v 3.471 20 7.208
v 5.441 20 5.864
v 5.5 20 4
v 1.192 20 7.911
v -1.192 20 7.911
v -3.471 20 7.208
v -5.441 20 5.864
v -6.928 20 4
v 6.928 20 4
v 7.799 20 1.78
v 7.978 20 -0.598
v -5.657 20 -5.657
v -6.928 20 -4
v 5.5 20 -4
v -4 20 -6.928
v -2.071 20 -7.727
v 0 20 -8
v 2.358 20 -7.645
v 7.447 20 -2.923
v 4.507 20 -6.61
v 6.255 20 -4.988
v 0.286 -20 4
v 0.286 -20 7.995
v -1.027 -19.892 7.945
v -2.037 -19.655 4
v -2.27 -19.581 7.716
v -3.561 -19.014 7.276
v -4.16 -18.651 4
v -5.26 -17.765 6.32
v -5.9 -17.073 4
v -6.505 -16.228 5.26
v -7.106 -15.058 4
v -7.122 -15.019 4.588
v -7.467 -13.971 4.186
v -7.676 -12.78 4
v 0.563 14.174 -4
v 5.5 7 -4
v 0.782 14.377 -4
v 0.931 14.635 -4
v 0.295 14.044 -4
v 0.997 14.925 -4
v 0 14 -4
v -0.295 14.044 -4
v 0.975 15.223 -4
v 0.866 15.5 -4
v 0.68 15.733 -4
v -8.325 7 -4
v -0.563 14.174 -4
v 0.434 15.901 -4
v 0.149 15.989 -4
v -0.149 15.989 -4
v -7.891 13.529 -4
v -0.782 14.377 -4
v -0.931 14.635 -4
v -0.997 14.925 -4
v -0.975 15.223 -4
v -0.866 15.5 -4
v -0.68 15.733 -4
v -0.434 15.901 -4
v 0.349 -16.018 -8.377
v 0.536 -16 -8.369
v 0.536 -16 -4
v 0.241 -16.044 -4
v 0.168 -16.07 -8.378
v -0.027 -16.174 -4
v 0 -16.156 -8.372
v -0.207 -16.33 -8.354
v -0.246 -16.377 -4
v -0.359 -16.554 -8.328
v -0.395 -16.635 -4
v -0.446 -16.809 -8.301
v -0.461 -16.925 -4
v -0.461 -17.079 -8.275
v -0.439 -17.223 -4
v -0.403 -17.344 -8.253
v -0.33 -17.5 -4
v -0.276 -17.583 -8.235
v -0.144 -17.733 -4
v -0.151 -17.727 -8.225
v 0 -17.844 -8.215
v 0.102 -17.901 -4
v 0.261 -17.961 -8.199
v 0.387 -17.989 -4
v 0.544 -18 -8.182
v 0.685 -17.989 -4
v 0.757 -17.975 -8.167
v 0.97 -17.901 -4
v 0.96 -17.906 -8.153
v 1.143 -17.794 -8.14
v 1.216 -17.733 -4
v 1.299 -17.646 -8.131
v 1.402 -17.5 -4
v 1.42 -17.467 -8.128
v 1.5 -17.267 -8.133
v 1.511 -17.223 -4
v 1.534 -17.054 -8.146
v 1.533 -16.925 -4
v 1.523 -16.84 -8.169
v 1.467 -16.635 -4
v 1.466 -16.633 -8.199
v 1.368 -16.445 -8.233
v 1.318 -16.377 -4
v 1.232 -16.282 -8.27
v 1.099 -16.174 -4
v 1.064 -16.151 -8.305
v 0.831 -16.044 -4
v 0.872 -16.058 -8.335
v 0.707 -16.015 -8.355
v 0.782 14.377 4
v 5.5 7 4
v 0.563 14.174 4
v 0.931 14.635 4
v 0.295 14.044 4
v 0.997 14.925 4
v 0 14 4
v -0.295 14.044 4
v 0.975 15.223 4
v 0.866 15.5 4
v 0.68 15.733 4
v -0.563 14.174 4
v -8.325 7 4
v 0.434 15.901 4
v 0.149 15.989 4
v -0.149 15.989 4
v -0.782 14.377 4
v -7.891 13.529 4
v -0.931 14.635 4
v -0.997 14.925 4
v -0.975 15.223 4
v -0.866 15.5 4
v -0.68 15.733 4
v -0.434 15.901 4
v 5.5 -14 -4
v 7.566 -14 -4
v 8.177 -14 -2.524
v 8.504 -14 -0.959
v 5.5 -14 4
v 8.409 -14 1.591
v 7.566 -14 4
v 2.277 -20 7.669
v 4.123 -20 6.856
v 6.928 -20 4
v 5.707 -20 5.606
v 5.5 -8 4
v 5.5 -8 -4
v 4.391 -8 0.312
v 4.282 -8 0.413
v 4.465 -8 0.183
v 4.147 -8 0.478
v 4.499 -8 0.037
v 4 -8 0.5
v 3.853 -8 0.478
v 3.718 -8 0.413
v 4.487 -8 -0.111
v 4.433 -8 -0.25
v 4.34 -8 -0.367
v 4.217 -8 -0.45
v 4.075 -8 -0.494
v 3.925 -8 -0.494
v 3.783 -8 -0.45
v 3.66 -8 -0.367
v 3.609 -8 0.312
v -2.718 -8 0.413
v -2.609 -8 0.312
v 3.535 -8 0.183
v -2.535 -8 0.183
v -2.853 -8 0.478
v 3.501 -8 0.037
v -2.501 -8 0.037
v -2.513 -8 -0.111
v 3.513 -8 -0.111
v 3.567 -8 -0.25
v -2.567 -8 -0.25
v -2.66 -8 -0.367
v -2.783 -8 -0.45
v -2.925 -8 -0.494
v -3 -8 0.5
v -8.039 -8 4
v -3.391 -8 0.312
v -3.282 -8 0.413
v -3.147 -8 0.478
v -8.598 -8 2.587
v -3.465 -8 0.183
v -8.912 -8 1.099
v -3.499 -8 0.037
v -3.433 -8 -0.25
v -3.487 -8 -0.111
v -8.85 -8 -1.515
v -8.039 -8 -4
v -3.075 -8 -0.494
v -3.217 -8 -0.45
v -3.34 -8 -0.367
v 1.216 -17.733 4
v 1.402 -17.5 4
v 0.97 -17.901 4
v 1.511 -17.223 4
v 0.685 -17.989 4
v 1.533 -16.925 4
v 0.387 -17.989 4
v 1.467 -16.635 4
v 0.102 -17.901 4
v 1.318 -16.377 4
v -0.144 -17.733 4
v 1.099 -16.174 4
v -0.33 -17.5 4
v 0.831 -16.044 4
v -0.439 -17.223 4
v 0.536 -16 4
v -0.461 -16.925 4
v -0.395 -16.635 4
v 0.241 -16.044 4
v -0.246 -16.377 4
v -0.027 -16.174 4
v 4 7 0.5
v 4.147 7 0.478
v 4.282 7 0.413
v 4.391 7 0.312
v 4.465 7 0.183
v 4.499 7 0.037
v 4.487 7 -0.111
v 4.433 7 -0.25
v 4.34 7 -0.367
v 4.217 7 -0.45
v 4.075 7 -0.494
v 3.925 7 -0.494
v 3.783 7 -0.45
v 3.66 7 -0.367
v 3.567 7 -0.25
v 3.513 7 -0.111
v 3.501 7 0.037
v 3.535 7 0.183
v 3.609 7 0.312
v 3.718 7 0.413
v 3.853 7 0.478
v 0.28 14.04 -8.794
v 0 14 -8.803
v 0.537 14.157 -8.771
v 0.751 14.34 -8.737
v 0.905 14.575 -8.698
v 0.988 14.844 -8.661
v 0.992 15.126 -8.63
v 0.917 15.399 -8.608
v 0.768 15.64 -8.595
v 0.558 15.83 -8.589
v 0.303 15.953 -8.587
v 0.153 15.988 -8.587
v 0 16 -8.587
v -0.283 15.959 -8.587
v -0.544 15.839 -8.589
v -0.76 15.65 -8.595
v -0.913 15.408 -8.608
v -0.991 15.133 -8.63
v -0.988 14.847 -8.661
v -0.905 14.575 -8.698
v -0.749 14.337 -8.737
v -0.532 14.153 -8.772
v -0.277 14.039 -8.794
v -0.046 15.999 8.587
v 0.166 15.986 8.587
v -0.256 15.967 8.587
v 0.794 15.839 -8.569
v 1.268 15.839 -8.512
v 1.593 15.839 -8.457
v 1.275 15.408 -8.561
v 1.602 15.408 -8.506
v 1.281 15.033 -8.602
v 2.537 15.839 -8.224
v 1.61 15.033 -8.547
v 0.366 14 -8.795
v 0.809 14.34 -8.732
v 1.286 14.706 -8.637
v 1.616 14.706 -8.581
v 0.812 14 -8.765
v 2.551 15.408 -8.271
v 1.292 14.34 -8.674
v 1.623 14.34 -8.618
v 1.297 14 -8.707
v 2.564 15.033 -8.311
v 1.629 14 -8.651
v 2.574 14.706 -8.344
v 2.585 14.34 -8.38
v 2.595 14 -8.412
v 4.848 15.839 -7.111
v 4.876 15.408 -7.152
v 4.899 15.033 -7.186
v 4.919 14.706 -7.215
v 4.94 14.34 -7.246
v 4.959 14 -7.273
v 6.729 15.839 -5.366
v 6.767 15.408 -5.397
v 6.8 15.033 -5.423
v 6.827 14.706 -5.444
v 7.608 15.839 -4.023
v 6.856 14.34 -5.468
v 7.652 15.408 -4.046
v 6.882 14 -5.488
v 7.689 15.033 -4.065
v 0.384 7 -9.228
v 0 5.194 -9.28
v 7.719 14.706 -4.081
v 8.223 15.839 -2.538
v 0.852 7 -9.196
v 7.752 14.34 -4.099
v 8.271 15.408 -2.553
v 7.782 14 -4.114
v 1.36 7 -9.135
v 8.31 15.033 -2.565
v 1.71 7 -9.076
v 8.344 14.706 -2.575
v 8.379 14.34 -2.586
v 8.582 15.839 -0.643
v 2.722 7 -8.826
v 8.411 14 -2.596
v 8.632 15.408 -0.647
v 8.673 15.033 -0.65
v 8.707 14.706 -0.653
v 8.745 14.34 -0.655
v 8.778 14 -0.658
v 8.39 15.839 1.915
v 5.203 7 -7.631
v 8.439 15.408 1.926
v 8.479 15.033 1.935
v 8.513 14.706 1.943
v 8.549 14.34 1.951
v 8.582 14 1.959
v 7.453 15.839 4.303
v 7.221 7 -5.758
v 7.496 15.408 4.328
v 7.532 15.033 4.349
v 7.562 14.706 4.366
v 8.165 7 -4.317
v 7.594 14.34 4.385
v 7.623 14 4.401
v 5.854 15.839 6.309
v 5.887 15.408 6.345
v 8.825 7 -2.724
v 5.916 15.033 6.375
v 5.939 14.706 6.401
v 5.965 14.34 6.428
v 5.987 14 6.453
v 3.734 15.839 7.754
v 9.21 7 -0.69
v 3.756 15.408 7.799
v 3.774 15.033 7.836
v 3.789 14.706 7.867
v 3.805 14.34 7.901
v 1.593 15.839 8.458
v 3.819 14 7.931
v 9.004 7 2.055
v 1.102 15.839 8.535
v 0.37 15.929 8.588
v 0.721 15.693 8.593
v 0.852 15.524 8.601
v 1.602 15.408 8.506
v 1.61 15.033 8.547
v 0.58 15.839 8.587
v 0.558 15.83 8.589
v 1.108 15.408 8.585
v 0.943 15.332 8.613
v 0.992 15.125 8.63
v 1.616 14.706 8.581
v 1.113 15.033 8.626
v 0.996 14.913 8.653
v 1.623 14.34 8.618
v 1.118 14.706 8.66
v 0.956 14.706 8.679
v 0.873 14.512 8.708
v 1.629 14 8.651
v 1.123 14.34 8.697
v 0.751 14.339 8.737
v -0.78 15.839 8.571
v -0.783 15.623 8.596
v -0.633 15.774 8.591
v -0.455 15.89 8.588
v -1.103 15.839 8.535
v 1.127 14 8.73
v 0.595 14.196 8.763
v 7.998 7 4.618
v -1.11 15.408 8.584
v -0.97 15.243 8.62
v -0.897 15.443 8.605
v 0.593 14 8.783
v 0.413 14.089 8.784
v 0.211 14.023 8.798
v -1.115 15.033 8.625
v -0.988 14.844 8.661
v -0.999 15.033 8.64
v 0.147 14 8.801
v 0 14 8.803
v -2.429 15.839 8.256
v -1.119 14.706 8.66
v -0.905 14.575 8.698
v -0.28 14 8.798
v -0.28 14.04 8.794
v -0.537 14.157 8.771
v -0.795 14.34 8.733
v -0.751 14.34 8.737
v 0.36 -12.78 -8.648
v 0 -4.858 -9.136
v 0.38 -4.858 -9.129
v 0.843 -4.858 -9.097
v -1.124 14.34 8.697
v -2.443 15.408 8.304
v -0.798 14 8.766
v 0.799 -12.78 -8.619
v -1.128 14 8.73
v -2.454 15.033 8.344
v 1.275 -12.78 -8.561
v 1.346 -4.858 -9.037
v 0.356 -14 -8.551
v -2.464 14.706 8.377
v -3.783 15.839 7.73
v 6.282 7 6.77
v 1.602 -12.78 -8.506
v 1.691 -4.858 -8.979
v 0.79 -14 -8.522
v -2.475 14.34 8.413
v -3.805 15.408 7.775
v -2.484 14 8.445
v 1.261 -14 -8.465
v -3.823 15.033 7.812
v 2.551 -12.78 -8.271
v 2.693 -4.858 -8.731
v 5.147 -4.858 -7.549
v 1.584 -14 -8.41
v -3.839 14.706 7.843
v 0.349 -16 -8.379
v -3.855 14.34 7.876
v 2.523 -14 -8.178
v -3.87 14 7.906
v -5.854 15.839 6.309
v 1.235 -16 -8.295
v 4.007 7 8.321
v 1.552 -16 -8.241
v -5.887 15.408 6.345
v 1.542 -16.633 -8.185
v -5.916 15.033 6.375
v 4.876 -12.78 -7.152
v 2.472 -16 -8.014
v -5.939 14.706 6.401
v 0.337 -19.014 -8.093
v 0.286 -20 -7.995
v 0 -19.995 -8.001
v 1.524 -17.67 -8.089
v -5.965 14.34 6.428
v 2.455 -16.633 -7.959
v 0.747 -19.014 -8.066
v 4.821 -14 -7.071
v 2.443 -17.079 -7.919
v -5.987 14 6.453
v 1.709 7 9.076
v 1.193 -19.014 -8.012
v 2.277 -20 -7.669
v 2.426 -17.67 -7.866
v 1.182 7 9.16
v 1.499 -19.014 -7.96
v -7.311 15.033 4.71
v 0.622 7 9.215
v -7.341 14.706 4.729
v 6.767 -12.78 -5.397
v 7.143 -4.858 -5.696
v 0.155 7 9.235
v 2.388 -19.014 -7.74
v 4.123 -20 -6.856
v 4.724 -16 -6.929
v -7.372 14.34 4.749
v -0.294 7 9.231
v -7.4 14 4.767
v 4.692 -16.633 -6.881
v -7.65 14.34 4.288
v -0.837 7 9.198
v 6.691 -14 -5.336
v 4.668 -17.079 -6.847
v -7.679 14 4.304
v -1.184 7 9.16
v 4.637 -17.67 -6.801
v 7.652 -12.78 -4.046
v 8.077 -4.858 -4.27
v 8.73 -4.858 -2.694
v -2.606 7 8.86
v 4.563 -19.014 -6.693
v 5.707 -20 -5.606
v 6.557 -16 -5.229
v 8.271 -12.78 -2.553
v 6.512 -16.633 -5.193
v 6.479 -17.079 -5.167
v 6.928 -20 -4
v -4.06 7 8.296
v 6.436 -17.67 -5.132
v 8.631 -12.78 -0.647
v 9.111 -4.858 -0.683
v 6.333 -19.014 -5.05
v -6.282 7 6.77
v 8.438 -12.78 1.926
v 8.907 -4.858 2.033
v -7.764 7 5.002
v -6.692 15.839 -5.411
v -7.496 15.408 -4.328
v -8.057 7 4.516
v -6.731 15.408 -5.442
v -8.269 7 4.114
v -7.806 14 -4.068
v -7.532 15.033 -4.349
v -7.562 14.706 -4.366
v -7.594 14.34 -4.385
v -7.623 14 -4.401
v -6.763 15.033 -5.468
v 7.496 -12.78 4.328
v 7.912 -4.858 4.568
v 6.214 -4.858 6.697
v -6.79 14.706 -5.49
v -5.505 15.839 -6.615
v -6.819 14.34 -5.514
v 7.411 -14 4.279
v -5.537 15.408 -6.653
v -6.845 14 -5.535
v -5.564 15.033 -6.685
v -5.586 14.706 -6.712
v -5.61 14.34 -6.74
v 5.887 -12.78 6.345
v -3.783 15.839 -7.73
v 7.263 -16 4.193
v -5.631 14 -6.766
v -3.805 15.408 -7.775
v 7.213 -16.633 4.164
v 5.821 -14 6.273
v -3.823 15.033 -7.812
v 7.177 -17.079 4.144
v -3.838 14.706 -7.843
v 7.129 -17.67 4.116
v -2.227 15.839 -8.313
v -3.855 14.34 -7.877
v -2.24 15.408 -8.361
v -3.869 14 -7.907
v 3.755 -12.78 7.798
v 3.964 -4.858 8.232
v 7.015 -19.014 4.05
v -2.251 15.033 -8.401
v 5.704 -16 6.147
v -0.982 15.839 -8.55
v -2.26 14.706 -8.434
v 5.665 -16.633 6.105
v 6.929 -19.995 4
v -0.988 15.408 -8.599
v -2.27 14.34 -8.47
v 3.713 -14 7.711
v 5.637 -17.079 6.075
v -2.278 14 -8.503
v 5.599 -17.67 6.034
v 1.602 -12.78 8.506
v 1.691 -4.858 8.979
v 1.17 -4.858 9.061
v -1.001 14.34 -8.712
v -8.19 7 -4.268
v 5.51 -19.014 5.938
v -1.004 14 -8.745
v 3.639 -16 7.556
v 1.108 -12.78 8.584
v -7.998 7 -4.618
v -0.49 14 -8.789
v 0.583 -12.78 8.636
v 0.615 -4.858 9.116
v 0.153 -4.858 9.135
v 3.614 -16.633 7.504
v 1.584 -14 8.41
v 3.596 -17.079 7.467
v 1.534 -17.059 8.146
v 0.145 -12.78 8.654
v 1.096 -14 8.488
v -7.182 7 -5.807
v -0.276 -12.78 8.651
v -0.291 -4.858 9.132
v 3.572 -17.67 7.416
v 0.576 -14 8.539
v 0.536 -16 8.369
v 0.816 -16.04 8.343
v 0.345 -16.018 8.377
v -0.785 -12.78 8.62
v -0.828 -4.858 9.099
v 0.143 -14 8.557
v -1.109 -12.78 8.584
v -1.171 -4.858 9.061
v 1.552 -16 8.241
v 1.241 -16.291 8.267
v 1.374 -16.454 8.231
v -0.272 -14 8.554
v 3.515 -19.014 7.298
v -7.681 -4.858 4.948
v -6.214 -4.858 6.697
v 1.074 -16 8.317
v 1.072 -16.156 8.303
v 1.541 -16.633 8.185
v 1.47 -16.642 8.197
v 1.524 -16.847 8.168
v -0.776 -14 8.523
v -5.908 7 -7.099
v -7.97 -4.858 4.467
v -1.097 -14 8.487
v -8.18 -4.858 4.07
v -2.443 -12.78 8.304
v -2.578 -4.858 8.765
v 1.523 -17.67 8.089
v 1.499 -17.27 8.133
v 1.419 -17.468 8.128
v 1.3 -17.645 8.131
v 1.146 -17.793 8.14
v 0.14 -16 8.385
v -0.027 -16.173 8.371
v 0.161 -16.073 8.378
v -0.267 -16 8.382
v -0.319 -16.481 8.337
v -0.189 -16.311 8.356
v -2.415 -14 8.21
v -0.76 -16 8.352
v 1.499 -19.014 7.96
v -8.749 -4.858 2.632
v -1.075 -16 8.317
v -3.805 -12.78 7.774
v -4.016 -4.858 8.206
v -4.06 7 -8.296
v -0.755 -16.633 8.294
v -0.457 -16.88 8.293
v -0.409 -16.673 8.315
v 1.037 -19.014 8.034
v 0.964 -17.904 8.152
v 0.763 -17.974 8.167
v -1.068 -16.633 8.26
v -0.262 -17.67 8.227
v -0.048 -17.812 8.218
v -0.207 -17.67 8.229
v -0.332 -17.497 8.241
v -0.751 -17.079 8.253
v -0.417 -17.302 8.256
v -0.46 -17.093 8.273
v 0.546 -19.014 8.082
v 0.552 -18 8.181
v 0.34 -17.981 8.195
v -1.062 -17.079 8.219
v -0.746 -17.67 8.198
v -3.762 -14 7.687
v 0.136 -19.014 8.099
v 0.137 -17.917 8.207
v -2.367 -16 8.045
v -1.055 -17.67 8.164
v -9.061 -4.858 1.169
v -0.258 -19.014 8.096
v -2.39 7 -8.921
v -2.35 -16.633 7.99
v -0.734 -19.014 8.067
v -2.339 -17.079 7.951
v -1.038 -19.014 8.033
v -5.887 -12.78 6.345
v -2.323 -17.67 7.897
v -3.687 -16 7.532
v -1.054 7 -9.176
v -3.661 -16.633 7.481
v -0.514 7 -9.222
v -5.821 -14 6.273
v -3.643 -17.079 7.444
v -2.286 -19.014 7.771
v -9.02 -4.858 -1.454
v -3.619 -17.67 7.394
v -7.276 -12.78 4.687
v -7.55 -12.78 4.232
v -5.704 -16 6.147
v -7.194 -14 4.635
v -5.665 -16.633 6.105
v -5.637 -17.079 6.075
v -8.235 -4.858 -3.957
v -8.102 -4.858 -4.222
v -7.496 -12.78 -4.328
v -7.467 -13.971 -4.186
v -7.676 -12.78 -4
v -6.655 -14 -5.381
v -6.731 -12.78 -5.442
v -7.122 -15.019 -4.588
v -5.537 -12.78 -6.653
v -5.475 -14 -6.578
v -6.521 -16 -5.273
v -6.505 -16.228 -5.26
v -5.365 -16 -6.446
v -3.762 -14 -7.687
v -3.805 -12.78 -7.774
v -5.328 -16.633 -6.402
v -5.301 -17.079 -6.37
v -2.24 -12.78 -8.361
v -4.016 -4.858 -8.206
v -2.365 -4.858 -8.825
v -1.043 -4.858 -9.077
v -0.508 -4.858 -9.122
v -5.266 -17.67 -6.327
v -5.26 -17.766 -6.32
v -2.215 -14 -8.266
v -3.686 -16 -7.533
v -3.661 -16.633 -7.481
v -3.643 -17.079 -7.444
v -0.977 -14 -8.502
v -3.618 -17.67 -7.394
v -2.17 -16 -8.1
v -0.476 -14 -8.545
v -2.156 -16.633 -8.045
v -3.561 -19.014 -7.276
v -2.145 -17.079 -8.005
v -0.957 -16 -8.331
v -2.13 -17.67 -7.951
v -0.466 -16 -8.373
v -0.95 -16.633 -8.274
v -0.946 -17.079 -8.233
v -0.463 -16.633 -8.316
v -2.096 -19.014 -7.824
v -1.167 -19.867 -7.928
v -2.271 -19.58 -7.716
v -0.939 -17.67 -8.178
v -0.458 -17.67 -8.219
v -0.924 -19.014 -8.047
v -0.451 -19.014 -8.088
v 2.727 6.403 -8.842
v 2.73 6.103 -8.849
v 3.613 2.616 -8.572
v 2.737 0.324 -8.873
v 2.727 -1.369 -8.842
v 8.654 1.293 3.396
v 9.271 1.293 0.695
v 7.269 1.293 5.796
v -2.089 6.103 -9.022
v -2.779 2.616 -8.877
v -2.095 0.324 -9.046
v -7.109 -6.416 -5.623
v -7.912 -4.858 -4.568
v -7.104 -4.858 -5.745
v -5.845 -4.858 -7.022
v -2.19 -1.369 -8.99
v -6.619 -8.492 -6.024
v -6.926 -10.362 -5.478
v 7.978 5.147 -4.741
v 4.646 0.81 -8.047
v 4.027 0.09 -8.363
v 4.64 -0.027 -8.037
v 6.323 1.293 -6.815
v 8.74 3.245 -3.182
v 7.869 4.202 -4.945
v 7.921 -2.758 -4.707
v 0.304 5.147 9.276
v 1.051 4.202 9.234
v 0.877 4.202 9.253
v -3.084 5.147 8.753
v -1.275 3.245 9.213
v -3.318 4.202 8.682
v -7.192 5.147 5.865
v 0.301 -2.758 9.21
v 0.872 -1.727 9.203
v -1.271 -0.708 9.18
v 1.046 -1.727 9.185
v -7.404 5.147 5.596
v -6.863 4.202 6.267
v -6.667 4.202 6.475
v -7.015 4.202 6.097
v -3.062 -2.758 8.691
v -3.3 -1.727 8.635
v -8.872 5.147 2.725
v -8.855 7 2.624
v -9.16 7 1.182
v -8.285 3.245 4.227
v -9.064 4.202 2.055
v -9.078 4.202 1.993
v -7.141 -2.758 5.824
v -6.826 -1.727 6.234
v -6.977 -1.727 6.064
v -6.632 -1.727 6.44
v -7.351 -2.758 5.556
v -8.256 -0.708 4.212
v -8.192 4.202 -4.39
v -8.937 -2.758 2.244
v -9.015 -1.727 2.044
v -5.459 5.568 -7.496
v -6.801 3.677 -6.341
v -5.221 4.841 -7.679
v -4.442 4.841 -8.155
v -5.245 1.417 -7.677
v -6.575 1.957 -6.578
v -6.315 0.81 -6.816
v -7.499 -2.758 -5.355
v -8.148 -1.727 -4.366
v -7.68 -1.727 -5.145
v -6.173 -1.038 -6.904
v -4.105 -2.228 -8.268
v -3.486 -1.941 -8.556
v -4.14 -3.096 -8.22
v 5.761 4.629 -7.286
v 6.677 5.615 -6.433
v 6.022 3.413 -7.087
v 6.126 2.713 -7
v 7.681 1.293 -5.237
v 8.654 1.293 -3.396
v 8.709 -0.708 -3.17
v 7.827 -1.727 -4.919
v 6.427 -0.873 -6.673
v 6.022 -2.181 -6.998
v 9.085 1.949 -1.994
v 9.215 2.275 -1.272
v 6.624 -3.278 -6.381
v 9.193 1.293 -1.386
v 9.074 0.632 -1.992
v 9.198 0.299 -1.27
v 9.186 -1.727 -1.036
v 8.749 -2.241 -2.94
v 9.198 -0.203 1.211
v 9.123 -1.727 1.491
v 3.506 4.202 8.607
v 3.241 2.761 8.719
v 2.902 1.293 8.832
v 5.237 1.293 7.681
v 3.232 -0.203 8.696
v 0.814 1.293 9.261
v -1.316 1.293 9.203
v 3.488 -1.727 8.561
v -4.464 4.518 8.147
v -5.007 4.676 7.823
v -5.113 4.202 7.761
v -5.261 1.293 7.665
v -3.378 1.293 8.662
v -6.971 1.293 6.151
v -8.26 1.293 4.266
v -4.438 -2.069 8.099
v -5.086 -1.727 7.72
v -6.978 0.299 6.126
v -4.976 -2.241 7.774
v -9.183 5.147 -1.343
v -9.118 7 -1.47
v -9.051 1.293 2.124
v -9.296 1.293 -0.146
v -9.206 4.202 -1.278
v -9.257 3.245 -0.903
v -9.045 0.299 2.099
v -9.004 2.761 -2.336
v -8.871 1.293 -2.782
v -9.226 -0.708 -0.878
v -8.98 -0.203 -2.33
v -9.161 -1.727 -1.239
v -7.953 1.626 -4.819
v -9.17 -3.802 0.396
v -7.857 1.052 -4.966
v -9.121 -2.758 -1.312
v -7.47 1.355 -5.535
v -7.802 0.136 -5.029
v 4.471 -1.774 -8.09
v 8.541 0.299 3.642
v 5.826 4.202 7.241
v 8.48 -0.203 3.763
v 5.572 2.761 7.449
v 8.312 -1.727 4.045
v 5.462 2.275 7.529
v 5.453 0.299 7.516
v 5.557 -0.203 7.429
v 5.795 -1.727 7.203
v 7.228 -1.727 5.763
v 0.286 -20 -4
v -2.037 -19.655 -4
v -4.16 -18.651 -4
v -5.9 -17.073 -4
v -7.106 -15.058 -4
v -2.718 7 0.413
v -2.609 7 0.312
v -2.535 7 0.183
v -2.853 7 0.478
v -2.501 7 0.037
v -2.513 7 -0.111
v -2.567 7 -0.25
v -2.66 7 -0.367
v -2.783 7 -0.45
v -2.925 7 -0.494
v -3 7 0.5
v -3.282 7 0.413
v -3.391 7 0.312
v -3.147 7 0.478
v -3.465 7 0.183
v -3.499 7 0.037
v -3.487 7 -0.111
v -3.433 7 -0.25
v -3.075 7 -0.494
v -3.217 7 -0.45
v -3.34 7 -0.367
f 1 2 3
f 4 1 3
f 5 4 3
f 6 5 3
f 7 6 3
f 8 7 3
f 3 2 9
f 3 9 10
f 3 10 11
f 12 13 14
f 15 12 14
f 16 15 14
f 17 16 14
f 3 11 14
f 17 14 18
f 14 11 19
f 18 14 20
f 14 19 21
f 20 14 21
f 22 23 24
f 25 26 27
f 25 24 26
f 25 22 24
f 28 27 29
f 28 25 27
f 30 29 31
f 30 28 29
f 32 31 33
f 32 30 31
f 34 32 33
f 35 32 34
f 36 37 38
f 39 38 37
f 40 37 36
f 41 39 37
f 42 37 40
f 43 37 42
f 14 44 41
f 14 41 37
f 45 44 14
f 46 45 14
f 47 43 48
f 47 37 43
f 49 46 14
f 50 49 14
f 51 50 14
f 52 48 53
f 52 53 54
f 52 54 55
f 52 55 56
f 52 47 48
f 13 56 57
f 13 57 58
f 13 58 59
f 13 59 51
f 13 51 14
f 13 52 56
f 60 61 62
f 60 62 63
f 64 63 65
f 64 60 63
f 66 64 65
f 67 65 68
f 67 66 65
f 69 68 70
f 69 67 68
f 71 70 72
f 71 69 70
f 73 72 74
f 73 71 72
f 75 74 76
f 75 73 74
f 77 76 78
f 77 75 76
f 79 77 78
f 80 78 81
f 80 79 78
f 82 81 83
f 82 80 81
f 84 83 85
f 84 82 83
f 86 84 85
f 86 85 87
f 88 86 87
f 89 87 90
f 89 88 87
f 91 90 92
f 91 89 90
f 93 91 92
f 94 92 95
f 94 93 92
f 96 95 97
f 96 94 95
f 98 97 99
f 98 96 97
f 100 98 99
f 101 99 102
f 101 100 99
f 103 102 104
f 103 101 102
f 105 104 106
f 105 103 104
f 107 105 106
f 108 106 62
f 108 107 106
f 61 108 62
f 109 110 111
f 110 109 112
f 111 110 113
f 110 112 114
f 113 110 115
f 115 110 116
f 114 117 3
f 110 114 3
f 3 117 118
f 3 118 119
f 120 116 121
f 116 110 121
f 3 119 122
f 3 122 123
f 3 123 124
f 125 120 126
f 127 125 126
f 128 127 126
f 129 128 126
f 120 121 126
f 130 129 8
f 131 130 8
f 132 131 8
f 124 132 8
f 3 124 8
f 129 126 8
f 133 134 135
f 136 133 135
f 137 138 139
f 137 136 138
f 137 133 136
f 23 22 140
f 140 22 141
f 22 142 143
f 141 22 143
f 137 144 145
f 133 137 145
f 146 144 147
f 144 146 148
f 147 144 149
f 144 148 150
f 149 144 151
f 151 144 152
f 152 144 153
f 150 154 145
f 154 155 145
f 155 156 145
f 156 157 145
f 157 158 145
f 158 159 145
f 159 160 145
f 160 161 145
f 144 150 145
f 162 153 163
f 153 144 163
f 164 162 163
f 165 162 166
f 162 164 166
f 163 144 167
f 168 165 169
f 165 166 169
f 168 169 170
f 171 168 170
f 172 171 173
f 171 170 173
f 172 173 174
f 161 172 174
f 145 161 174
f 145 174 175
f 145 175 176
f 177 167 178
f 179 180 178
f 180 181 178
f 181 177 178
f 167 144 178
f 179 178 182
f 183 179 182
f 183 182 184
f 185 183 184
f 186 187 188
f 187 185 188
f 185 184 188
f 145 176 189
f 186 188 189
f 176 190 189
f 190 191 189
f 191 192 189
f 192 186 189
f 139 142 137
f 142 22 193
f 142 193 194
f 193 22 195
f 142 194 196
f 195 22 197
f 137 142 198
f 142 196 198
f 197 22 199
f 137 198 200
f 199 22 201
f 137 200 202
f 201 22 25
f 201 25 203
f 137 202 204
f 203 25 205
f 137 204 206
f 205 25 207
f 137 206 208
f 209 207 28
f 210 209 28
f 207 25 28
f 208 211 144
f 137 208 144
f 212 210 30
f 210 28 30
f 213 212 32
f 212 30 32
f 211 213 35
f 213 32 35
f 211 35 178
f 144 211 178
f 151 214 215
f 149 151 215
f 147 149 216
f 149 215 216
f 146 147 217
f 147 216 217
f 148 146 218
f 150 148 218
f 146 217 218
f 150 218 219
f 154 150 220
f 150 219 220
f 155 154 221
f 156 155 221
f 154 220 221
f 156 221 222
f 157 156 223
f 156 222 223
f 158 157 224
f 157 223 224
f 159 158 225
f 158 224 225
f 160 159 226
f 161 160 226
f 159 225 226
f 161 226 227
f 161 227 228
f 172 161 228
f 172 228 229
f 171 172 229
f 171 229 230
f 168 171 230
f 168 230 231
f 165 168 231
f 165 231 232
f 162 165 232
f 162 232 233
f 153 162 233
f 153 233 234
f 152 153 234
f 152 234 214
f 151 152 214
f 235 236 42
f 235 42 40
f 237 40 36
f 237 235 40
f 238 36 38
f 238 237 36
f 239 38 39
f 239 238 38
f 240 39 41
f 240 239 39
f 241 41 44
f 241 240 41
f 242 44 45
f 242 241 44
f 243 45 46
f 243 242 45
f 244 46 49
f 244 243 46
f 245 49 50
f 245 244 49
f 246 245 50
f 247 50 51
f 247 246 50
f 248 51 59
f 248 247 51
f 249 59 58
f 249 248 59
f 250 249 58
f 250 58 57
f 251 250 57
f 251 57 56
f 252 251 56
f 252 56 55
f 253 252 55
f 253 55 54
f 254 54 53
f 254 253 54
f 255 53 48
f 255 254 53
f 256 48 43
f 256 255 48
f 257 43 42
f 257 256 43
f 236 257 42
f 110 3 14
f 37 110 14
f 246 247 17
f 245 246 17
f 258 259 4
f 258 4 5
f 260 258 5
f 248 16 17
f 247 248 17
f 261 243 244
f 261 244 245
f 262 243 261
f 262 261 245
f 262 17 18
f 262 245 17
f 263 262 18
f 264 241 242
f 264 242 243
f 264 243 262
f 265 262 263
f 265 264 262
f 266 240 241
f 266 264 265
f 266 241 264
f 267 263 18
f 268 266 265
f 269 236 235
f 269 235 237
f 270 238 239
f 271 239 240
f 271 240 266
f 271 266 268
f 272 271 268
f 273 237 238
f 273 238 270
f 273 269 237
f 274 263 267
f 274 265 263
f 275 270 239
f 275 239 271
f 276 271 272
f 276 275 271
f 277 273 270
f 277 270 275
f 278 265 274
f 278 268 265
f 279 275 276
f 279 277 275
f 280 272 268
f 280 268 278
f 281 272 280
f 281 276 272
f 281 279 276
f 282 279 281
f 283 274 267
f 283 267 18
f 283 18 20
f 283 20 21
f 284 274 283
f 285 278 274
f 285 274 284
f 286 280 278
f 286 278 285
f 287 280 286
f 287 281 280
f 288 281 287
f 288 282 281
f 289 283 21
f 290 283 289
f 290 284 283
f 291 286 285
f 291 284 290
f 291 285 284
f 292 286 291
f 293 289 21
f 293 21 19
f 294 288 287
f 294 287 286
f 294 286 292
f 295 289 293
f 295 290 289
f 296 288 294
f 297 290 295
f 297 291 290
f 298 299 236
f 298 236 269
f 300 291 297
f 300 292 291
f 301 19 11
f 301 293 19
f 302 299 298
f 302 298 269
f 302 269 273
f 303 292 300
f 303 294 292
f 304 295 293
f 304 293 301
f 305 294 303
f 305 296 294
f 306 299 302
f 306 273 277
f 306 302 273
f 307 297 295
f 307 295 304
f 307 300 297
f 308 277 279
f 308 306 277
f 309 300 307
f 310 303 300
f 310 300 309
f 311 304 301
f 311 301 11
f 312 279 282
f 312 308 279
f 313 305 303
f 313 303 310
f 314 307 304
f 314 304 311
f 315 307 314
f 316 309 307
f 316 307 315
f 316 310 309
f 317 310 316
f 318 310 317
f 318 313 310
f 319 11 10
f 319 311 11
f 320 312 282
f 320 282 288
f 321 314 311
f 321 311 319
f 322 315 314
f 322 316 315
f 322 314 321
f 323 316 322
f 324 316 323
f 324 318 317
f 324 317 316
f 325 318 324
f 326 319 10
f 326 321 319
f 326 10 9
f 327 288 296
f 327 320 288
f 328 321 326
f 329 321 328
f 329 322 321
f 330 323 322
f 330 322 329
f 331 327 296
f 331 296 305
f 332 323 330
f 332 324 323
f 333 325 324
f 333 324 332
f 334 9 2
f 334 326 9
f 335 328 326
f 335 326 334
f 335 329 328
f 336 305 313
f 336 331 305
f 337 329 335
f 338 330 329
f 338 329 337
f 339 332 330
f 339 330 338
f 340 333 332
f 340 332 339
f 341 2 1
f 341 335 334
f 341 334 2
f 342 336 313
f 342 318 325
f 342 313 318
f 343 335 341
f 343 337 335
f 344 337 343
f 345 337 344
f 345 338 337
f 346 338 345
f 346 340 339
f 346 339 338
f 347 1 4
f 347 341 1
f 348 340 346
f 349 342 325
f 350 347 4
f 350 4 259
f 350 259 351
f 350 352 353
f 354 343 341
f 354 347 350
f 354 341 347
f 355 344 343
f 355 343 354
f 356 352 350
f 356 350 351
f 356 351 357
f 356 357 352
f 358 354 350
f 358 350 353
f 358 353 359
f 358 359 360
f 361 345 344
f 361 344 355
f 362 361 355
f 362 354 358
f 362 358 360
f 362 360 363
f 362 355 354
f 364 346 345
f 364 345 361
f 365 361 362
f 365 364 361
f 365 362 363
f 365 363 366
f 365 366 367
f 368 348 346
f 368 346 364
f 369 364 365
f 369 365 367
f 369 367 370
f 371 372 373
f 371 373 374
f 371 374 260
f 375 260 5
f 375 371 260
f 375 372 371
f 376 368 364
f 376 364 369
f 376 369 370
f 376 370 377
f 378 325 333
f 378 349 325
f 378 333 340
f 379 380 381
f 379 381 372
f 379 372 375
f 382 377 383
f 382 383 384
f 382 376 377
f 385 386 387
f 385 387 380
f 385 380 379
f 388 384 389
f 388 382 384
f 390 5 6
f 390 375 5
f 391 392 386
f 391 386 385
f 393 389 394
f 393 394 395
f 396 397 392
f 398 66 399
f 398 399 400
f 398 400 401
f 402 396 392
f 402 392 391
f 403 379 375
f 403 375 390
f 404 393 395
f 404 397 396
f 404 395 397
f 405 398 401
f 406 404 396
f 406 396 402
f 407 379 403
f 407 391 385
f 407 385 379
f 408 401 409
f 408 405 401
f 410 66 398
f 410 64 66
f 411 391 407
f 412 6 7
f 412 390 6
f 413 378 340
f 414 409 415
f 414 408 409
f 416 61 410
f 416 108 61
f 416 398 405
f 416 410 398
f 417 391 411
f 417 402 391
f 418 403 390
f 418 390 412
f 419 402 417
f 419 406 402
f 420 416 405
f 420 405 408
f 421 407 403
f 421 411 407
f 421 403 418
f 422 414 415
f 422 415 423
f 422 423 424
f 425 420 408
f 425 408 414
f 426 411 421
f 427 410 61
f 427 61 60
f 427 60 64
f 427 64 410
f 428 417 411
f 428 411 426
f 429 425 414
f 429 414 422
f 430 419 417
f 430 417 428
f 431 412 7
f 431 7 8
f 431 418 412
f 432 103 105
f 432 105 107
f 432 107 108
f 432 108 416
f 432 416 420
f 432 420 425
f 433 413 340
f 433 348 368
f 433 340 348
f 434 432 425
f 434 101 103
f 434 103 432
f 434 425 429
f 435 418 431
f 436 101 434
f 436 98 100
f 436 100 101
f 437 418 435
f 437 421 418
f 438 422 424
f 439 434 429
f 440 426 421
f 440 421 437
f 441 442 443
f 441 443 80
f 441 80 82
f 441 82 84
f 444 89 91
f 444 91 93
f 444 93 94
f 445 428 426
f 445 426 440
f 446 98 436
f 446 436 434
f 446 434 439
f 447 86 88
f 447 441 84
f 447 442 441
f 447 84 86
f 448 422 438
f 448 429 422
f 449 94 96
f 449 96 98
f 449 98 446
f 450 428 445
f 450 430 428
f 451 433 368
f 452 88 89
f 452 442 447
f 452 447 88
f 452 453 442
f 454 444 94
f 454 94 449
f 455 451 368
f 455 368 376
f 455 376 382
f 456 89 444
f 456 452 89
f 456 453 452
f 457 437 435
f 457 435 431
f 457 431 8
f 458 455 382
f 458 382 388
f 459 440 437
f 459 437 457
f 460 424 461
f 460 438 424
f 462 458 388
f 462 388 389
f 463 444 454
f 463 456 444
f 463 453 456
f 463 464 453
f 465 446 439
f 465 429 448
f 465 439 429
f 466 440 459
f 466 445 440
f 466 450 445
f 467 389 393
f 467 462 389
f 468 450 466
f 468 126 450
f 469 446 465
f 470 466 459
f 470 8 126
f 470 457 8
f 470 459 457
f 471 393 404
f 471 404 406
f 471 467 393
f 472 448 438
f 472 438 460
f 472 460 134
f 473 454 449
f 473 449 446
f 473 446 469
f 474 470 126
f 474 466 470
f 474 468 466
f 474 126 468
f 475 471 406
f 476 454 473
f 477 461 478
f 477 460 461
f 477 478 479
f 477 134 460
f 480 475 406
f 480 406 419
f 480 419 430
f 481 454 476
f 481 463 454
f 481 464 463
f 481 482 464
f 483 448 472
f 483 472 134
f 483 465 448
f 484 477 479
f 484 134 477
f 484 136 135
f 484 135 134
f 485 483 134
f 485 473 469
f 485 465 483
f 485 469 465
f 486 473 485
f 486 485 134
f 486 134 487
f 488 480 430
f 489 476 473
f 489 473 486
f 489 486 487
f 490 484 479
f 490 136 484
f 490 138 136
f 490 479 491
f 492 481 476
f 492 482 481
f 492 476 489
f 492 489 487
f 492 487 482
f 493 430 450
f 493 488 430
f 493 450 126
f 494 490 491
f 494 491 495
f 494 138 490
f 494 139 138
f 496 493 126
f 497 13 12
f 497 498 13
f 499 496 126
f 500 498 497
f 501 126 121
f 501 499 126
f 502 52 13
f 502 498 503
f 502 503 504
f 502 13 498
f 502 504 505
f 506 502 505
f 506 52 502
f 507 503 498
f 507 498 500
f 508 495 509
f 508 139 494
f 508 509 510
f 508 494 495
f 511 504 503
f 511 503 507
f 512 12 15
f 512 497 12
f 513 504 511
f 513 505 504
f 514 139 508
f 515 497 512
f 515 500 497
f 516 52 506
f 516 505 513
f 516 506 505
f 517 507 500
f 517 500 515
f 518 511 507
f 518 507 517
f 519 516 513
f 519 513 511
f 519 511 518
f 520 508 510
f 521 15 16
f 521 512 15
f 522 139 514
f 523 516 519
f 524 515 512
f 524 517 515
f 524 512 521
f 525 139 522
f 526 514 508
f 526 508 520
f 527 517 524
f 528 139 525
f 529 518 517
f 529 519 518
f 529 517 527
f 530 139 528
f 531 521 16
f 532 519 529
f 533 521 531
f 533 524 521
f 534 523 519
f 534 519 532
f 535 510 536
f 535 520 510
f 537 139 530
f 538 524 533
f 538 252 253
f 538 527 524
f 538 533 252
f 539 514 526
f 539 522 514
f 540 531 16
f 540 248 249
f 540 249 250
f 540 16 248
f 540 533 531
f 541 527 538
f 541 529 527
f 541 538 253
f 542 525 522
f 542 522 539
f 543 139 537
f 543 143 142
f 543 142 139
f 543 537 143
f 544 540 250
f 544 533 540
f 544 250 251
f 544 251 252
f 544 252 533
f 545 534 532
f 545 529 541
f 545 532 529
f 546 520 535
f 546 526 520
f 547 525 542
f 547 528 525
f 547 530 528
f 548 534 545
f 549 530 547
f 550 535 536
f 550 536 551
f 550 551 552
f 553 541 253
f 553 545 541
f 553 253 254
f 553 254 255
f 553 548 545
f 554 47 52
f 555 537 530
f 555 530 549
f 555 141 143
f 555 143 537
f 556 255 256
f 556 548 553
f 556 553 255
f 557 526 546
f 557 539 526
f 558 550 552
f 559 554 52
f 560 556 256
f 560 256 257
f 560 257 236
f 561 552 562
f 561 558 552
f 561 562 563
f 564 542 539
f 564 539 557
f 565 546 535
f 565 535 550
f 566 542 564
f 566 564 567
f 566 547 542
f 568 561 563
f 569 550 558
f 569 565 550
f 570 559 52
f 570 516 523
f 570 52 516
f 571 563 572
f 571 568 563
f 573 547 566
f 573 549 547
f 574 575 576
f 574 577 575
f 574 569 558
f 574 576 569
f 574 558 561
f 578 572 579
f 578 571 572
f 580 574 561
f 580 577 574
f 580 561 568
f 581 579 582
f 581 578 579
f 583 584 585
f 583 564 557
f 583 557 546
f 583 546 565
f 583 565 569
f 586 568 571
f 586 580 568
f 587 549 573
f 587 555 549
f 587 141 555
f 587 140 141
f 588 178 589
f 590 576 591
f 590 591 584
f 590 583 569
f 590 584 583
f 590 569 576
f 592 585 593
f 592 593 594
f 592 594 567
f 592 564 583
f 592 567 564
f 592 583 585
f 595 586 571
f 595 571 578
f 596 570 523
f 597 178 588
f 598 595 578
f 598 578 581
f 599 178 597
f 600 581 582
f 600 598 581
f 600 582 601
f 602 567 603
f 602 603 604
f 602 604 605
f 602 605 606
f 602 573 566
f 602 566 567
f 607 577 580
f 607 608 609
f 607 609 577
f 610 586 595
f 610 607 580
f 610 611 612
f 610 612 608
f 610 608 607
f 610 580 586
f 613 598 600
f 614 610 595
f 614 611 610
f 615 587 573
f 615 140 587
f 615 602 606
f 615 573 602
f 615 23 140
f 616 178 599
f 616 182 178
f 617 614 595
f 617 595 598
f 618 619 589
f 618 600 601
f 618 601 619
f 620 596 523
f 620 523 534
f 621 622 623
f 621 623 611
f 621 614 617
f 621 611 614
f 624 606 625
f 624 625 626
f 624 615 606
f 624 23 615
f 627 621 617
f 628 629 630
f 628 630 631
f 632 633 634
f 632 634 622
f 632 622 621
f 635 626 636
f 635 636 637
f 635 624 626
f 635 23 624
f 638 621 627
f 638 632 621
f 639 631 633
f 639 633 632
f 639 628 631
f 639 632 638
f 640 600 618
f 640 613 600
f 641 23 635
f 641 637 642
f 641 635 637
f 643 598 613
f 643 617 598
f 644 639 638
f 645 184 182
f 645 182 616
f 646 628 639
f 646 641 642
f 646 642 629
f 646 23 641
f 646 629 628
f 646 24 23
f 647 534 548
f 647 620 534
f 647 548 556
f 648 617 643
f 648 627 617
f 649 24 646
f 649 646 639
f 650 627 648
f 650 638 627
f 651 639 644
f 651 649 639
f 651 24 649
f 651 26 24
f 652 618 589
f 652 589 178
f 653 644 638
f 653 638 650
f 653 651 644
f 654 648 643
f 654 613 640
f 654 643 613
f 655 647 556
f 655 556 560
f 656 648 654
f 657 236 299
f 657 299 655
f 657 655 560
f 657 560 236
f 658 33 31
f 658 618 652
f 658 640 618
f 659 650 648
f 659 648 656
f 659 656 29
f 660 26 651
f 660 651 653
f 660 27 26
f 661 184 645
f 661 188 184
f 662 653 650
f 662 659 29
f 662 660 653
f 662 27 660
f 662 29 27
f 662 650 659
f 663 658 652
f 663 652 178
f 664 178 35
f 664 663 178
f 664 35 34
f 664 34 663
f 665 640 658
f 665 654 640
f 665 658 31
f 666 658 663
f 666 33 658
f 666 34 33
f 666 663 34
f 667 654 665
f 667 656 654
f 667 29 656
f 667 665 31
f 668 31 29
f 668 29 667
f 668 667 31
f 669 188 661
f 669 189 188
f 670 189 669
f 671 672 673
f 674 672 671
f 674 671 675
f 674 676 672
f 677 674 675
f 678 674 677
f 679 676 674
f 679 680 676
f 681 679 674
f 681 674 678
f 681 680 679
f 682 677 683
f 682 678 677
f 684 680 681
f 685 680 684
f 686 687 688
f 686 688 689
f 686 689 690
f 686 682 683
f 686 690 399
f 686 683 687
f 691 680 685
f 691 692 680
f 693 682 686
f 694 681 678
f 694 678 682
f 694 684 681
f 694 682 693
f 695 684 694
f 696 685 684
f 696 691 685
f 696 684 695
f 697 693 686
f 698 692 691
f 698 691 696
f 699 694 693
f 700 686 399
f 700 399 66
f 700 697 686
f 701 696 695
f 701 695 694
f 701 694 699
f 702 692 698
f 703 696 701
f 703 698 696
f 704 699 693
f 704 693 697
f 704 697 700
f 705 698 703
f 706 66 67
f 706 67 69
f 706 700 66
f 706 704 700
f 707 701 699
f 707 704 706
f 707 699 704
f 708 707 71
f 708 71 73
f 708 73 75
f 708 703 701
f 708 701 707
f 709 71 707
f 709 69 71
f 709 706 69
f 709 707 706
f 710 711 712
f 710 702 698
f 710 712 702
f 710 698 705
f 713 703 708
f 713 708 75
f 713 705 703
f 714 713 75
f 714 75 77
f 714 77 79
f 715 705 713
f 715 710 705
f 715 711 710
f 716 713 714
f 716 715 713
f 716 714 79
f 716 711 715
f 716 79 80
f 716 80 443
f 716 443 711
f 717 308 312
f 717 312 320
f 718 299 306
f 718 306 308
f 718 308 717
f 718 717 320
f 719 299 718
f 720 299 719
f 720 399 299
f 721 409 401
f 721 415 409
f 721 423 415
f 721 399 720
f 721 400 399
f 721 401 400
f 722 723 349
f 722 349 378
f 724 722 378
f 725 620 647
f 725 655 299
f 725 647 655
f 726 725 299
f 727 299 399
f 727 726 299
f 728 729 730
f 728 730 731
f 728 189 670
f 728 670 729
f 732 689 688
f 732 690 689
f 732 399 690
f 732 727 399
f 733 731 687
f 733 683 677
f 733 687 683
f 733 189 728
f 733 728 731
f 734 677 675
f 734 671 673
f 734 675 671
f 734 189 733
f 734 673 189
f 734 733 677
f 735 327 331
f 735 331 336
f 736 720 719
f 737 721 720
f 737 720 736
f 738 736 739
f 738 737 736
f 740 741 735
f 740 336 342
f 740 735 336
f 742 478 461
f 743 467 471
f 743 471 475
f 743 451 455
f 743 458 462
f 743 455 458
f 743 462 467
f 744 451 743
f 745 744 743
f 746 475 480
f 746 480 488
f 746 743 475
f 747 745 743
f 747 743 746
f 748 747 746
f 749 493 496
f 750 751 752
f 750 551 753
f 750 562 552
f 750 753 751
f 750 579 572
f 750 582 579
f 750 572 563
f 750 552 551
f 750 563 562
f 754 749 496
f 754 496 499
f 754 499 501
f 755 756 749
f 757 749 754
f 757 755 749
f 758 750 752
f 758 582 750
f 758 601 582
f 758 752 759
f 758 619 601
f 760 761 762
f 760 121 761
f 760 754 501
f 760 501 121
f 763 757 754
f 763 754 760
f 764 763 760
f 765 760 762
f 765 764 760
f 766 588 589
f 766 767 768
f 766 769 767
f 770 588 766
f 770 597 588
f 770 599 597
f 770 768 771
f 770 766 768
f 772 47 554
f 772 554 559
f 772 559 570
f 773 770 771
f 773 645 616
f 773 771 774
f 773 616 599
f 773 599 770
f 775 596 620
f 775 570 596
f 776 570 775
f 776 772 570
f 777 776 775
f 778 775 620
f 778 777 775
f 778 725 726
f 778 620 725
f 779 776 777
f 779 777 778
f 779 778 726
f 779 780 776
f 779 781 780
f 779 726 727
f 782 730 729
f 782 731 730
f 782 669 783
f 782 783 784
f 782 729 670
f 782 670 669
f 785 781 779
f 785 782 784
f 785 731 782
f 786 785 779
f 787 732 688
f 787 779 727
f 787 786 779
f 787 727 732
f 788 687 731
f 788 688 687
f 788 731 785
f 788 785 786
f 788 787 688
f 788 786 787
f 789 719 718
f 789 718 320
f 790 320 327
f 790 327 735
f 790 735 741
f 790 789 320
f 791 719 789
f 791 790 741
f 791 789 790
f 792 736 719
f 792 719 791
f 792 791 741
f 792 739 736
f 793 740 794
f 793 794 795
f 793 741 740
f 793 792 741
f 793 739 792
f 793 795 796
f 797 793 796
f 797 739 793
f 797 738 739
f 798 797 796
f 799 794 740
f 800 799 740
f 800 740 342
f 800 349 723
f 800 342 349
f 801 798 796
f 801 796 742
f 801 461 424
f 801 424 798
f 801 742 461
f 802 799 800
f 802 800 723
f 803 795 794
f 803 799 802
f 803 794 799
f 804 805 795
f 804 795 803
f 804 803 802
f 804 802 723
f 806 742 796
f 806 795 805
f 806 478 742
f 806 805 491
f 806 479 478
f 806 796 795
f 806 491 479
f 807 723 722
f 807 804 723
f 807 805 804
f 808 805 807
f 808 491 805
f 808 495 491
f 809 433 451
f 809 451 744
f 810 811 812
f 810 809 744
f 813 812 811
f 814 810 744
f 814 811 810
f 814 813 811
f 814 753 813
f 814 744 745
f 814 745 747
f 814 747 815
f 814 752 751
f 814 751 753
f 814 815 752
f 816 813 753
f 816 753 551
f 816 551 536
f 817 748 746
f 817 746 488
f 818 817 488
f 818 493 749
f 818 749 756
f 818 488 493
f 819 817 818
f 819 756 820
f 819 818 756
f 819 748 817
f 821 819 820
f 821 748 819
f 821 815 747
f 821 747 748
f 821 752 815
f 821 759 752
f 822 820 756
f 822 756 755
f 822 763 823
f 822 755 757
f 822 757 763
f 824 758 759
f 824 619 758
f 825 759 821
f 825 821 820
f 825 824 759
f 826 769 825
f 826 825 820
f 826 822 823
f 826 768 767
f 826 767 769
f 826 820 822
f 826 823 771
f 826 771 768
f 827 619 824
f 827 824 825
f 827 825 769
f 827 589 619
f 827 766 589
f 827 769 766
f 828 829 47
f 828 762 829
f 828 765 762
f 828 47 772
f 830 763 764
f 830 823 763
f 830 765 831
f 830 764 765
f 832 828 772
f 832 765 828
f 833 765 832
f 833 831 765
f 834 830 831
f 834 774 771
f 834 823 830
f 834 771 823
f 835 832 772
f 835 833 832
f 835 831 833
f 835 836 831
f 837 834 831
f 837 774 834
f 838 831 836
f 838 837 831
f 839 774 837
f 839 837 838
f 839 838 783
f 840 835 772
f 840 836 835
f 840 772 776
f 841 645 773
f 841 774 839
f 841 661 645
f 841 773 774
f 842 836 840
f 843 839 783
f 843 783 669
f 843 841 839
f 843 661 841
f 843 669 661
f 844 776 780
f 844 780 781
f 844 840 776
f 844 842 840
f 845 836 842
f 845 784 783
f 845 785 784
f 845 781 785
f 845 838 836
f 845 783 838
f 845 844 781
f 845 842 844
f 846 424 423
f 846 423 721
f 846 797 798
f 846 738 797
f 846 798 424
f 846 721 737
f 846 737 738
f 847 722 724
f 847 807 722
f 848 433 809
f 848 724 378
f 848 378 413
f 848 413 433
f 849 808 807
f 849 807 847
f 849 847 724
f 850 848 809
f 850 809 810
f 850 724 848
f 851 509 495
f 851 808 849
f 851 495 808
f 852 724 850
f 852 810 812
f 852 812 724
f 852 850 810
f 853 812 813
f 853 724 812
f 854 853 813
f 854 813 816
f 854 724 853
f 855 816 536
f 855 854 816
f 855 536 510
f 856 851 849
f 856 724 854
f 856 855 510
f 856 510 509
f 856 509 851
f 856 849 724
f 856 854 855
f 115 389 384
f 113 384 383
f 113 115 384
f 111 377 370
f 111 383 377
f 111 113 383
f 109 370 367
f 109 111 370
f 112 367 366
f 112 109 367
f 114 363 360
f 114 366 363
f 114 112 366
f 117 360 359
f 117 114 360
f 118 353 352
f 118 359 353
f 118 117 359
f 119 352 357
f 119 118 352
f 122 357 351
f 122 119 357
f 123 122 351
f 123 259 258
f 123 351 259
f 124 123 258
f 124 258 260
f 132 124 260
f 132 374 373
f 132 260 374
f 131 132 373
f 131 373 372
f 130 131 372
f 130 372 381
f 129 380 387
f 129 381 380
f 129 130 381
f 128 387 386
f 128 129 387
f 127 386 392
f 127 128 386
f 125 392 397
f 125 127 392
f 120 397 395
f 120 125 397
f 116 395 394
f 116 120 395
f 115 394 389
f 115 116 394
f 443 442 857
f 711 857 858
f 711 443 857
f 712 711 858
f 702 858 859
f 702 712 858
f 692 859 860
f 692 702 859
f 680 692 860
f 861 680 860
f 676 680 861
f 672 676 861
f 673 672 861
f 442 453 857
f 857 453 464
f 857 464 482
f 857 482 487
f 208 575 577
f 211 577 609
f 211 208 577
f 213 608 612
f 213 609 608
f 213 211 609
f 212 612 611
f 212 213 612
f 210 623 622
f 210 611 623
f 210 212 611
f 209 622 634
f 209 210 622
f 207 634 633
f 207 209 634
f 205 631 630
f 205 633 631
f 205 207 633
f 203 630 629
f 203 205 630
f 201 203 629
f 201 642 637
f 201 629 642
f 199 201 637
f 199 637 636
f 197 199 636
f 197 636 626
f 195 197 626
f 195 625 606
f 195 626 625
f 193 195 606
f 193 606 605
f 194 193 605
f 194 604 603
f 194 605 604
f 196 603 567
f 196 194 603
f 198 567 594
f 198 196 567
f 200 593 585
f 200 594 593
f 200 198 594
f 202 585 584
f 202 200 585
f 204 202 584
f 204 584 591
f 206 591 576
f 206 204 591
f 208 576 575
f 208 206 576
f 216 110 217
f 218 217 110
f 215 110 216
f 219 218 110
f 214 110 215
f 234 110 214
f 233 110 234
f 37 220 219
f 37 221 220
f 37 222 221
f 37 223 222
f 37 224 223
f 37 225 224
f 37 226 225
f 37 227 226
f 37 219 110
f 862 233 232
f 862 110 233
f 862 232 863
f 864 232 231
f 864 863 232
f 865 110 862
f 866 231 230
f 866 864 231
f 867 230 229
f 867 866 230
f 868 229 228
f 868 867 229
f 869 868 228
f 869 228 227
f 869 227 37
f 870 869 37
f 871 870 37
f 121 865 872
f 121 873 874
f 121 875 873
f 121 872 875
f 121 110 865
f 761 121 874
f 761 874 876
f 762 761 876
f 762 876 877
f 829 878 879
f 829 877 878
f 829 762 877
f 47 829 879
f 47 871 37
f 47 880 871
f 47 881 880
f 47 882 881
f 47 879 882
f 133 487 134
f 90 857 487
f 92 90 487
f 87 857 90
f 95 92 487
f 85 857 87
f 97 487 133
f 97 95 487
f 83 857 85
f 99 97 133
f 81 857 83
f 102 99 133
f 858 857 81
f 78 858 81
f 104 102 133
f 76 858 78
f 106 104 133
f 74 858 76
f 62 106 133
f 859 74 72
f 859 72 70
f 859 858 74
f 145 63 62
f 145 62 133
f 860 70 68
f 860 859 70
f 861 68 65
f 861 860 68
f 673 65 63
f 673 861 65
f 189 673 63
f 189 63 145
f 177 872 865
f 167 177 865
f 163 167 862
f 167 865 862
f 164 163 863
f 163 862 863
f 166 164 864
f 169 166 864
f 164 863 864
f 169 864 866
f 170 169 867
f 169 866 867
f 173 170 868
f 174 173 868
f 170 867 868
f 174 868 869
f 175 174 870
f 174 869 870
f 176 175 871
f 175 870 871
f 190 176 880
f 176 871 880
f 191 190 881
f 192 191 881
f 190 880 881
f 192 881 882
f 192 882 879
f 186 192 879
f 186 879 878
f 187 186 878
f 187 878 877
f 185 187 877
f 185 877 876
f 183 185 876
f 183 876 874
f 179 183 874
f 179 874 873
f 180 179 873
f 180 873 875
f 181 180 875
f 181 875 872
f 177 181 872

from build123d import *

# Parameters (mm, degrees)
CUT_EXTRUDE1_DEPTH      = 5.5
CUT_EXTRUDE1_DEPTH_BACK = 24.938835821
SKETCH2_W               = 8
SKETCH2_H               = 13
SKETCH2_H_2             = 12
CUT_EXTRUDE2_DEPTH      = 24.938835821
CUT_EXTRUDE2_DEPTH_BACK = 24.938835821
SKETCH3_R               = 1
CUT_EXTRUDE4_START      = 10
CUT_EXTRUDE4_DEPTH      = 20
SKETCH6_R               = 0.5
CUT_EXTRUDE5_DEPTH      = 31.03444459
SKETCH7_W               = 8
SKETCH7_H               = 6
CUT_EXTRUDE6_DEPTH      = 27.563957465


with BuildPart() as part:
    # Sketch1 → Revolve1 (revolve)
    with BuildSketch(Plane(origin=(0, 0, 0), x_dir=(0, 0, -1), z_dir=(1, 0, 0))):
        with BuildLine():
            Line((0, 20), (0, -20))
            Line((0, -20), (8, -20))
            add(Edge.make_bspline(
                [(8, 20), (10.604722665, 5.227883705), (8, -20)],
                knots=[0, 0, 0, 1, 1, 1], degree=2))
            Line((8, 20), (0, 20))
        make_face()
    revolve(axis=Axis((0, 20, 0), (0, -1, 0)))

    # Sketch2 → Cut-Extrude1 (cut, two sides: drawn at the far end of the back side and taken through both)
    with BuildSketch(Plane(origin=(0, 0, 0), x_dir=(0, 0, -1), z_dir=(1, 0, 0)).offset(-CUT_EXTRUDE1_DEPTH_BACK)):
        with Locations((0, 13.5)):
            Rectangle(SKETCH2_W, SKETCH2_H)
        with Locations((0, -14)):
            Rectangle(SKETCH2_W, SKETCH2_H_2)
    extrude(amount=CUT_EXTRUDE1_DEPTH + CUT_EXTRUDE1_DEPTH_BACK, mode=Mode.SUBTRACT)

    # Sketch3 → Cut-Extrude2 (cut, two sides: drawn at the far end of the back side and taken through both)
    with BuildSketch(Plane.XY.offset(-CUT_EXTRUDE2_DEPTH_BACK)):
        with Locations((0, 15)):
            Circle(SKETCH3_R)
        with Locations((0.535898385, -17)):
            Circle(SKETCH3_R)
    extrude(amount=CUT_EXTRUDE2_DEPTH + CUT_EXTRUDE2_DEPTH_BACK, mode=Mode.SUBTRACT)

    # Sketch5 → Cut-Extrude4 (cut)
    with BuildSketch(Plane.XY.offset(CUT_EXTRUDE4_START)):
        with BuildLine():
            add(Edge.make_bspline(
                [(-7.683797501, -12.69281547), (-7.471742946, -15.132228264), (-7.218170916, -17.567798425), (-6.92820323, -20)],
                knots=[0.390461667, 0.390461667, 0.390461667, 0.390461667, 1, 1, 1, 1], degree=3))
            Line((-6.92820323, -20), (0.286146459, -20))
            ThreePointArc((0.286146459, -20), (-5.120214435, -17.896716195), (-7.683797501, -12.69281547))
        make_face()
    extrude(amount=-CUT_EXTRUDE4_DEPTH, mode=Mode.SUBTRACT)

    # Sketch6 → Cut-Extrude5 (cut, through all)
    with BuildSketch(Plane(origin=(0, 7, 0), x_dir=(1, 0, 0), z_dir=(0, 1, 0))):
        with Locations((-3, 0)):
            Circle(SKETCH6_R)
        with Locations((4, 0)):
            Circle(SKETCH6_R)
    extrude(amount=-CUT_EXTRUDE5_DEPTH, mode=Mode.SUBTRACT)

    # Sketch7 → Cut-Extrude6 (cut, through all)
    with BuildSketch(Plane.ZY.offset(-5.5)):
        with Locations((0, -17)):
            Rectangle(SKETCH7_W, SKETCH7_H)
    extrude(amount=-CUT_EXTRUDE6_DEPTH, mode=Mode.SUBTRACT)


solid = part.part
